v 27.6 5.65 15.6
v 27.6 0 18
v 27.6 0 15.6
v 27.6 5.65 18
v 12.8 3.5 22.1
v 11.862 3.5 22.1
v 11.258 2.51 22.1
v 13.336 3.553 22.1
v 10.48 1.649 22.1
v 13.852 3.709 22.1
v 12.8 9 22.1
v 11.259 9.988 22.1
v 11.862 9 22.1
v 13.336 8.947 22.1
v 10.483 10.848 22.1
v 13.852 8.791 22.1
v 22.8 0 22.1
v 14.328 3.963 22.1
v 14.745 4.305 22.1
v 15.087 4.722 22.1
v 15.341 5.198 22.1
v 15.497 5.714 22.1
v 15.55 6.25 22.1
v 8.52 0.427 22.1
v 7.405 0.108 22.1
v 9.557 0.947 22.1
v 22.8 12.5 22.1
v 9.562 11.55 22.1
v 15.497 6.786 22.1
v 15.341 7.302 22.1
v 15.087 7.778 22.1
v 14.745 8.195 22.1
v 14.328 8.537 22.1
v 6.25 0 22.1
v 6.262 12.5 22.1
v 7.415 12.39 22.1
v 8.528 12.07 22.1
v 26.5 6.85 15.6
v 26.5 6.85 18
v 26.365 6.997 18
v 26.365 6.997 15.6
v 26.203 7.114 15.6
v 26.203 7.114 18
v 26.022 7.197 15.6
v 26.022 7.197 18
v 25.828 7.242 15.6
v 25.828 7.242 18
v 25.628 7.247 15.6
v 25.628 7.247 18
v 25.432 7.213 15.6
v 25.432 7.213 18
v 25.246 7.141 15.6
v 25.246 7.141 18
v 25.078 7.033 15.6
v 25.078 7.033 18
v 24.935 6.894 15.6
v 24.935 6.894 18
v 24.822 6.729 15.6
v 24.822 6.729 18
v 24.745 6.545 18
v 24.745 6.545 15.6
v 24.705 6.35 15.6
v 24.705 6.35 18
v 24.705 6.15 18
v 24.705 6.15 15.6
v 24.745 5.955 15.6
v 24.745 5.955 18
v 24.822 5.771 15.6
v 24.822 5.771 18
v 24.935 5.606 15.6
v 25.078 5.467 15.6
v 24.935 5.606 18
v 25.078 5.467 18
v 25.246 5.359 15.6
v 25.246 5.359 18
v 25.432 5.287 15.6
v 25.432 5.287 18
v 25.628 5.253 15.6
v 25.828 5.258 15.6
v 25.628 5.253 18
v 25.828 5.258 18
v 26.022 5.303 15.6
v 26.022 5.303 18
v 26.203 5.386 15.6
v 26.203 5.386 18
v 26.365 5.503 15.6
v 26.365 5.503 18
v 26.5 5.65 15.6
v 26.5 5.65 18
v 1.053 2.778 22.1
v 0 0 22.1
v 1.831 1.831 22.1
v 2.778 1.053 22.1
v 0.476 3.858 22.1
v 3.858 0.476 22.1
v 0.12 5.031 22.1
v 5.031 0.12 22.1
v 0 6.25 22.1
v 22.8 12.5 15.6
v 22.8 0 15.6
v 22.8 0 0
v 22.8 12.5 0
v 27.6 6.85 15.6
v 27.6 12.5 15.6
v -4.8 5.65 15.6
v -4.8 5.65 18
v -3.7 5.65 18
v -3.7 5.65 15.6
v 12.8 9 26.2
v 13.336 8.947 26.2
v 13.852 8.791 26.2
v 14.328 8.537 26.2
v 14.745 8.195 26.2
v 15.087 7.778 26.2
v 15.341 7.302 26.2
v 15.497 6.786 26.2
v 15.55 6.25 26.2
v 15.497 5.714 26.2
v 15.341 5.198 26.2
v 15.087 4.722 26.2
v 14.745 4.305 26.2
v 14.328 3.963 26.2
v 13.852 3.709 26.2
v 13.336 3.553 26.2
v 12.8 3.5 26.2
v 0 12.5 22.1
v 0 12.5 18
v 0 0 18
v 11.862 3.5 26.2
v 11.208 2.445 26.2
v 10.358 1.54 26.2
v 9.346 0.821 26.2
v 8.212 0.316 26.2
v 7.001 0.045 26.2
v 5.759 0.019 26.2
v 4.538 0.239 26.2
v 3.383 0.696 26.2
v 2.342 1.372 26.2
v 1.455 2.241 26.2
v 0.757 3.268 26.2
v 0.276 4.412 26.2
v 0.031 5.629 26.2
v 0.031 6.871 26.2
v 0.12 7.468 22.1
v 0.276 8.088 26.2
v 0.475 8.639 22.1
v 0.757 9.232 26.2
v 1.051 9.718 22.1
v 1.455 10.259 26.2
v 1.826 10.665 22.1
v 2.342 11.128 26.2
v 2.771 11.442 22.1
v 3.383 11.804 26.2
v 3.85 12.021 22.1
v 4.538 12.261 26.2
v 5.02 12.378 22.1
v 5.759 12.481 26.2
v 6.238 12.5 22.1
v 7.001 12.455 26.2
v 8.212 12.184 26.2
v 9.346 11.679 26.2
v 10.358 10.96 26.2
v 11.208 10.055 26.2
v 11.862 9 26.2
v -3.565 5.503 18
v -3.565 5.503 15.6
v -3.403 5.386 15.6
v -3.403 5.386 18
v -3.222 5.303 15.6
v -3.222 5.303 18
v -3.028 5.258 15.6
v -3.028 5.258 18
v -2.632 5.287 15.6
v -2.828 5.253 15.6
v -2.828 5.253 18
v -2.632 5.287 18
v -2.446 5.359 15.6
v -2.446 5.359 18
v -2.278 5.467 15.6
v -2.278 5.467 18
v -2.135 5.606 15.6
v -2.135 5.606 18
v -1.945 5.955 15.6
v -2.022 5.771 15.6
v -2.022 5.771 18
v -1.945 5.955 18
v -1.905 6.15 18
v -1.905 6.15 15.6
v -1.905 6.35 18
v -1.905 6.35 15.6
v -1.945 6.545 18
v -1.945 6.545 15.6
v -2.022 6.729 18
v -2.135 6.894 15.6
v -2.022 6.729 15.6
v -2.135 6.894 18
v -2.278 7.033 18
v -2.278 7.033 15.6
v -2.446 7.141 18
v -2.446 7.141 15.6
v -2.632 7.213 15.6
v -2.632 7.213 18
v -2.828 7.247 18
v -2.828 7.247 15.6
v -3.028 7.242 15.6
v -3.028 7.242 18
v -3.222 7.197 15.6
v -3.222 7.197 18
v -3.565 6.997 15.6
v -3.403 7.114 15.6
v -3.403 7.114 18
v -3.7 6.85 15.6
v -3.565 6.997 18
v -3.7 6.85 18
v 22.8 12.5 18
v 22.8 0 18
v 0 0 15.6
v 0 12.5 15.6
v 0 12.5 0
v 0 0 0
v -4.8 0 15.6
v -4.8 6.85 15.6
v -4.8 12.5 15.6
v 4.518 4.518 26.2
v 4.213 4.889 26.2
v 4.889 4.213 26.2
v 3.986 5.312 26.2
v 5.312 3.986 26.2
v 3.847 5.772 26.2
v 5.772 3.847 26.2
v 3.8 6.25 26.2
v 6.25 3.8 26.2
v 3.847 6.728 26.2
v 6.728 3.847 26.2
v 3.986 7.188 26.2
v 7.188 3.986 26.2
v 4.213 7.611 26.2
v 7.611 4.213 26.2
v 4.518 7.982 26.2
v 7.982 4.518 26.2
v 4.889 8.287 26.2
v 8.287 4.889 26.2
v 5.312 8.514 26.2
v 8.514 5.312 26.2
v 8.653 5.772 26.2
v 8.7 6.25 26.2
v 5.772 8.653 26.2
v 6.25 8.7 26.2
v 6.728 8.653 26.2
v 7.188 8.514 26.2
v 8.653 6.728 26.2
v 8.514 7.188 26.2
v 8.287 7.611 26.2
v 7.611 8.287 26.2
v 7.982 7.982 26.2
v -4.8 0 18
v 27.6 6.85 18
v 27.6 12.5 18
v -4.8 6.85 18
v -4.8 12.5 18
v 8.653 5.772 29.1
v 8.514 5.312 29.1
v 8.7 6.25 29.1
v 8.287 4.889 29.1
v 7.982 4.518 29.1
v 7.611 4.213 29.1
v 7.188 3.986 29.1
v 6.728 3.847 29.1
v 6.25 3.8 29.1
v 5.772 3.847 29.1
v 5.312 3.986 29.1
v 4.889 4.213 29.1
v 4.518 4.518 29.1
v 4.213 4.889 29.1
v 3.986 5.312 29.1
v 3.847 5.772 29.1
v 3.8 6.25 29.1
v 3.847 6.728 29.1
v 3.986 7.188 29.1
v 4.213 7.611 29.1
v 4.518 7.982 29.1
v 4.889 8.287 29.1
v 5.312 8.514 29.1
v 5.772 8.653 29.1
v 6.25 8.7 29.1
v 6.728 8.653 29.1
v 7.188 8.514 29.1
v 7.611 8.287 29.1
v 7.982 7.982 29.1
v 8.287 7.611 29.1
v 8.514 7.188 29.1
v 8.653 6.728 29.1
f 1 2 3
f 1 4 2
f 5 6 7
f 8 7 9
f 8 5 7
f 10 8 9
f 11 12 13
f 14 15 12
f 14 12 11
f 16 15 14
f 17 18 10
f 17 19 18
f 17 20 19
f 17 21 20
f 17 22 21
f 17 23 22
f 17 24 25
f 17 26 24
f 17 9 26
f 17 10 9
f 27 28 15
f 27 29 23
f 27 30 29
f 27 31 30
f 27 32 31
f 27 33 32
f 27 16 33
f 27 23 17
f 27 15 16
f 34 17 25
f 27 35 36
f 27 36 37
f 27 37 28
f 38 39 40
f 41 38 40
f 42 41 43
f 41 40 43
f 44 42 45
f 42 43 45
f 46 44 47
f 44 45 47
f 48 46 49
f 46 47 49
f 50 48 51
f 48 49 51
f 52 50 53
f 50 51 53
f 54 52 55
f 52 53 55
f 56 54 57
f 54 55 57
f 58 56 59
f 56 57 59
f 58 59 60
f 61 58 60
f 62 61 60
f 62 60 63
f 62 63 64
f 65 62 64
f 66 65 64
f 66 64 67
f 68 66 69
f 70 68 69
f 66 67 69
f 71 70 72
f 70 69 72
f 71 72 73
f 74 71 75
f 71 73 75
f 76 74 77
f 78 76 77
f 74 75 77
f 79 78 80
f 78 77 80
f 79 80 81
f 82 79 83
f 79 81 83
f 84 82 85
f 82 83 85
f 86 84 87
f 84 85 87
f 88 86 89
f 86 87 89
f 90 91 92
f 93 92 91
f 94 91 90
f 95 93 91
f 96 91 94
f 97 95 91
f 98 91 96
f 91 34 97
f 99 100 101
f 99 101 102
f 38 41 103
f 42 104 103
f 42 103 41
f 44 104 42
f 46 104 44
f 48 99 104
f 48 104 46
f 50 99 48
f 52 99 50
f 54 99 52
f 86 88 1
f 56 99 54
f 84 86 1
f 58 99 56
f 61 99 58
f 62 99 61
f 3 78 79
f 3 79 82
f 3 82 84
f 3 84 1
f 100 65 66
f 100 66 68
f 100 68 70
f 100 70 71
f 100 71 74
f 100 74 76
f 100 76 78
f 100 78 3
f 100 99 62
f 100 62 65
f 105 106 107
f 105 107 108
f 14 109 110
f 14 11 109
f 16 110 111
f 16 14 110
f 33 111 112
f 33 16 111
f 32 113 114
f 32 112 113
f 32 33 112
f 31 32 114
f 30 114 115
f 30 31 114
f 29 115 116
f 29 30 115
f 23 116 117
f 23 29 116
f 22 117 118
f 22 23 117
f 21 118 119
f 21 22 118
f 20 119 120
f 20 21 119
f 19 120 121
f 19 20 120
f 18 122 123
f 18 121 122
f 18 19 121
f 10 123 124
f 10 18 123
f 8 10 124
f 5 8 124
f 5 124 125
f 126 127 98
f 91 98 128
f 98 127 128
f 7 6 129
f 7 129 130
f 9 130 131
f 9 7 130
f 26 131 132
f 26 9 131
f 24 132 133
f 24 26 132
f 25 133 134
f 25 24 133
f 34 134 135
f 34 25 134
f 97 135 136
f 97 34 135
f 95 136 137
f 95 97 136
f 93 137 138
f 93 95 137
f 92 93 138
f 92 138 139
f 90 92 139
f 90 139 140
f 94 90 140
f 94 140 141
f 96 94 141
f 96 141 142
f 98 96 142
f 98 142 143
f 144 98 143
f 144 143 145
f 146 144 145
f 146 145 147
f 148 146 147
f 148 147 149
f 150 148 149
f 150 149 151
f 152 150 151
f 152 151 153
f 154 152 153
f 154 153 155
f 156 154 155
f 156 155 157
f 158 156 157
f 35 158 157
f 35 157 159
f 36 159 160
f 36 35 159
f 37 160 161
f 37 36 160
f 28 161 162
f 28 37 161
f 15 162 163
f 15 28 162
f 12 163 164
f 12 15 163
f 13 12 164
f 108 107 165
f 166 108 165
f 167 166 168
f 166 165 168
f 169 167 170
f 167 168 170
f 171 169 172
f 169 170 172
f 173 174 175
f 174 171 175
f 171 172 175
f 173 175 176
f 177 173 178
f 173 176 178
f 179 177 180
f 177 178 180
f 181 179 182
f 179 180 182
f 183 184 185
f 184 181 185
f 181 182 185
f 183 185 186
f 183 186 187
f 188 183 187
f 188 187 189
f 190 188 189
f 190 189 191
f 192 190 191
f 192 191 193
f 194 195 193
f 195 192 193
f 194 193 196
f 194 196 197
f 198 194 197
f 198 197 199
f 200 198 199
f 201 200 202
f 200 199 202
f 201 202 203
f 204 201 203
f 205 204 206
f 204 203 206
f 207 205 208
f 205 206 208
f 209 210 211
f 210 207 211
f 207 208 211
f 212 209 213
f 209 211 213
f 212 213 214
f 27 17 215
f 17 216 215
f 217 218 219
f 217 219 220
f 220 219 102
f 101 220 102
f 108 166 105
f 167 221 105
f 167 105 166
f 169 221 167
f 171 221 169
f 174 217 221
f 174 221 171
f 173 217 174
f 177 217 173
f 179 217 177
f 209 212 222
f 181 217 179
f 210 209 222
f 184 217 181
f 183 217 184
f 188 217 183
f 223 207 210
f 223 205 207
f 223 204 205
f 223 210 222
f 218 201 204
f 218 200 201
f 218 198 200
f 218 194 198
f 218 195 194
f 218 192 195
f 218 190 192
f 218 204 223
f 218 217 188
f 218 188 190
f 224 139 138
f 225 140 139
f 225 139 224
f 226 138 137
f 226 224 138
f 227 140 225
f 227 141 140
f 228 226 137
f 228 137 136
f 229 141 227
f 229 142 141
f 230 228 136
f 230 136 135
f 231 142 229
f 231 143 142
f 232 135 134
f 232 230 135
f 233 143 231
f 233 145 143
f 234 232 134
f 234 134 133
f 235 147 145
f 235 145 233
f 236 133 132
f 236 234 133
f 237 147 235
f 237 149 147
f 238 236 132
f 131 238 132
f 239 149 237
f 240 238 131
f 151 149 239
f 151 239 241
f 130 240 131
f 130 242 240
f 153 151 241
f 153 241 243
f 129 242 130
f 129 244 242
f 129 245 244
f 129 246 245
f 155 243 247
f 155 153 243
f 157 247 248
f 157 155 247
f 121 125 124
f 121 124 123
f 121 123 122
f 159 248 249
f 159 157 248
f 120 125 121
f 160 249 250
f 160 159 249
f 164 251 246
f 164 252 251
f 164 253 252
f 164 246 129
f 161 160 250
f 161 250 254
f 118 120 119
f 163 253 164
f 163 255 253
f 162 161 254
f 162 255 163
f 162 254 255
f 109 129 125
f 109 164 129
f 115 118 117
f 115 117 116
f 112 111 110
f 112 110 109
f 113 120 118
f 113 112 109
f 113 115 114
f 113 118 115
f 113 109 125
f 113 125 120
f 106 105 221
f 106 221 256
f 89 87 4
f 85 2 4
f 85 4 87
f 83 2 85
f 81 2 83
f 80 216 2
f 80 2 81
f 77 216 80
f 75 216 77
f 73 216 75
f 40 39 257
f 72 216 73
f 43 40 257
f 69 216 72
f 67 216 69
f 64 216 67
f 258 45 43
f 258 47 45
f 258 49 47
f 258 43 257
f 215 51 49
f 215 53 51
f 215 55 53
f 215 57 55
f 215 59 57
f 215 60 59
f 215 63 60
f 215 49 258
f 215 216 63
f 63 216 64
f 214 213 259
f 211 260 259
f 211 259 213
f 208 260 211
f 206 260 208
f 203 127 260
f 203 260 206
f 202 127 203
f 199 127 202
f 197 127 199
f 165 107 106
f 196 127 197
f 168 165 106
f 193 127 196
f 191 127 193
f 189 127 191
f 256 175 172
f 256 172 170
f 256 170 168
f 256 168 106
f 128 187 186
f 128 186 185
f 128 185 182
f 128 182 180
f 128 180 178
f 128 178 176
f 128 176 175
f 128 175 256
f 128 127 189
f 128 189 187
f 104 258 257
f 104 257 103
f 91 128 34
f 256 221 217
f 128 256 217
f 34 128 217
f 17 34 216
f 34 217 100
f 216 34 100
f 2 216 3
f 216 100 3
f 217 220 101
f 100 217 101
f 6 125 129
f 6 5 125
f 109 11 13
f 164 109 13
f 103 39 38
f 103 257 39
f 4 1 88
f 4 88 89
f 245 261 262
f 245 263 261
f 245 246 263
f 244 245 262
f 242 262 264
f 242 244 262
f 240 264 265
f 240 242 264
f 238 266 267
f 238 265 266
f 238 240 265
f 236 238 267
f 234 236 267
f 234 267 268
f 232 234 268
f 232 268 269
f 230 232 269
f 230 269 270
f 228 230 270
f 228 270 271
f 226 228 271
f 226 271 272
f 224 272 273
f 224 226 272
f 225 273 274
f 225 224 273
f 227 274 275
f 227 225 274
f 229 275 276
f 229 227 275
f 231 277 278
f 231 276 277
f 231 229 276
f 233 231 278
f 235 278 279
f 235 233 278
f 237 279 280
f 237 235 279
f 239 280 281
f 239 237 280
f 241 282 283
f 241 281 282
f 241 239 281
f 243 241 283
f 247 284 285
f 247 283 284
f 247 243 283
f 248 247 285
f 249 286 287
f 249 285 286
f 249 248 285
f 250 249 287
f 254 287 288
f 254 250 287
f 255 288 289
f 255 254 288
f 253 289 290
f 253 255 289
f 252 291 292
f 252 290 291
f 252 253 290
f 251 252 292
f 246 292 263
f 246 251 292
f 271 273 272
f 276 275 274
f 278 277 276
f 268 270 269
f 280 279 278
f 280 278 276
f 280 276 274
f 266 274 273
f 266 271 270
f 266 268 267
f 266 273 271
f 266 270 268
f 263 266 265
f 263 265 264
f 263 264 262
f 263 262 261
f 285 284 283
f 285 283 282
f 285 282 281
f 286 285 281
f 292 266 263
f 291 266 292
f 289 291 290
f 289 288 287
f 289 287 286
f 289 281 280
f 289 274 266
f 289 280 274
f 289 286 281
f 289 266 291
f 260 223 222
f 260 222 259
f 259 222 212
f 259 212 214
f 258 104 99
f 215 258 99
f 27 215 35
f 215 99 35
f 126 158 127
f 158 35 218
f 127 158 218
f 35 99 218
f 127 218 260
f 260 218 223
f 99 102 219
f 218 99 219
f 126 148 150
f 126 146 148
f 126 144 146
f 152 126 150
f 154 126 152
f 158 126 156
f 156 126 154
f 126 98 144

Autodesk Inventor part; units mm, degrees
ref_plane "YZ Plane" through (0, 0, 0) normal (1, 0, 0) x (0, 1, 0)
ref_plane "XZ Plane" through (0, 0, 0) normal (0, 1, 0) x (-1, 0, 0)
sketch "Sketch1" plane through (0, 0, 0) normal (0, 0, 1) x (1, 0, 0)
  line L0 (0, 0) -> (22.8, 0)
  line L1 (22.8, 0) -> (22.8, 12.5)
  line L2 (22.8, 12.5) -> (0, 12.5)
  line L3 (0, 12.5) -> (0, 0)
  dimension "d0" = 22.8
  dimension "d1" = 12.5
extrude "Extrusion1" add sketch "Sketch1" along normal blind 22.1
sketch "Sketch2" plane through (22.8, 0, 0) normal (1, 0, 0) x (0, 0, -1)
  line L0 (0, 12.5) -> (-22.1, 12.5) projected
  line L1 (-22.1, 0) -> (-22.1, 12.5) projected
  line L2 (0, 0) -> (-22.1, 0) projected
  line L3 (-18, 12.5) -> (-15.6, 12.5)
  line L4 (-15.6, 12.5) -> (-15.6, 0)
  line L5 (-15.6, 0) -> (-18, 0)
  line L6 (-18, 0) -> (-18, 12.5)
  dimension "d4" = 2.4
  dimension "d5" = 4.1
extrude "Extrusion2" add sketch "Sketch2" along normal blind 4.8 contours L4 L2 L6 L0
sketch "Sketch3" plane through (22.8, 0, 18) normal (0, 0, 1) x (1, 0, 0)
  line L0 (0, 0) -> (0, 12.5) projected
  circle A0 centre (2.9, 6.25) radius 1
  point P0 (-22.8, 0)
  dimension "d8" = 2
  dimension "d9" = 2.9
extrude "Extrusion3" cut sketch "Sketch3" against normal up to surface (2.4 mm away)
sketch "Sketch4" plane through (27.6, 0, 0) normal (1, 0, 0) x (0, 0, -1)
  line L0 (-18, 12.5) -> (-18, 0) projected
  line L1 (-15.6, 0) -> (-15.6, 12.5) projected
  line L2 (-18, 6.85) -> (-15.6, 6.85)
  line L3 (-15.6, 6.85) -> (-15.6, 5.65)
  line L4 (-15.6, 5.65) -> (-18, 5.65)
  line L5 (-18, 5.65) -> (-18, 6.85)
  point P0 (0, 0)
  point P1 (-15.6, 6.25)
  point P2 (-15.6, 6.25)
  dimension "d12" = 1.2
extrude "Extrusion4" cut sketch "Sketch4" against normal blind 2
ref_plane "Work Plane1" through (11.4, 0, 0) normal (1, 0, 0) x (0, 0, -1)
mirror "Mirror1" about plane through (11.4, 0, 0) normal (1, 0, 0) of "Extrusion2", "Extrusion3", "Extrusion4"
sketch "Sketch5" plane through (0, 0, 22.1) normal (0, 0, 1) x (1, 0, 0)
  line L0 (0, 0) -> (22.8, 0) projected
  line L1 (22.8, 0) -> (22.8, 12.5) projected
  line L2 (0, 12.5) -> (0, 0) projected
  arc A0 (11.8625, 9) -> (11.8625, 3.5) centre (6.25, 6.25) ccw
  arc A1 (12.8, 3.5) -> (12.8, 9) centre (12.8, 6.25) ccw
  line L3 (12.8, 9) -> (11.8625, 9)
  line L4 (12.8, 3.5) -> (11.8625, 3.5)
  point P0 (0, 6.25)
  dimension "d16" = 5.5
  dimension "d17" = 10
extrude "Extrusion5" add sketch "Sketch5" along normal blind 4.1 contours A0 L3 A1 L4
sketch "Sketch6" plane through (0, 0, 26.2) normal (0, 0, 1) x (1, 0, 0)
  arc A0 (11.8625, 9) -> (11.8625, 3.5) centre (6.25, 6.25) ccw projected
  circle A1 centre (6.25, 6.25) radius 2.45
  point P0 (0, 0)
  dimension "d20" = 4.9
extrude "Extrusion6" add sketch "Sketch6" along normal blind 2.9
properties part number "Servo"
